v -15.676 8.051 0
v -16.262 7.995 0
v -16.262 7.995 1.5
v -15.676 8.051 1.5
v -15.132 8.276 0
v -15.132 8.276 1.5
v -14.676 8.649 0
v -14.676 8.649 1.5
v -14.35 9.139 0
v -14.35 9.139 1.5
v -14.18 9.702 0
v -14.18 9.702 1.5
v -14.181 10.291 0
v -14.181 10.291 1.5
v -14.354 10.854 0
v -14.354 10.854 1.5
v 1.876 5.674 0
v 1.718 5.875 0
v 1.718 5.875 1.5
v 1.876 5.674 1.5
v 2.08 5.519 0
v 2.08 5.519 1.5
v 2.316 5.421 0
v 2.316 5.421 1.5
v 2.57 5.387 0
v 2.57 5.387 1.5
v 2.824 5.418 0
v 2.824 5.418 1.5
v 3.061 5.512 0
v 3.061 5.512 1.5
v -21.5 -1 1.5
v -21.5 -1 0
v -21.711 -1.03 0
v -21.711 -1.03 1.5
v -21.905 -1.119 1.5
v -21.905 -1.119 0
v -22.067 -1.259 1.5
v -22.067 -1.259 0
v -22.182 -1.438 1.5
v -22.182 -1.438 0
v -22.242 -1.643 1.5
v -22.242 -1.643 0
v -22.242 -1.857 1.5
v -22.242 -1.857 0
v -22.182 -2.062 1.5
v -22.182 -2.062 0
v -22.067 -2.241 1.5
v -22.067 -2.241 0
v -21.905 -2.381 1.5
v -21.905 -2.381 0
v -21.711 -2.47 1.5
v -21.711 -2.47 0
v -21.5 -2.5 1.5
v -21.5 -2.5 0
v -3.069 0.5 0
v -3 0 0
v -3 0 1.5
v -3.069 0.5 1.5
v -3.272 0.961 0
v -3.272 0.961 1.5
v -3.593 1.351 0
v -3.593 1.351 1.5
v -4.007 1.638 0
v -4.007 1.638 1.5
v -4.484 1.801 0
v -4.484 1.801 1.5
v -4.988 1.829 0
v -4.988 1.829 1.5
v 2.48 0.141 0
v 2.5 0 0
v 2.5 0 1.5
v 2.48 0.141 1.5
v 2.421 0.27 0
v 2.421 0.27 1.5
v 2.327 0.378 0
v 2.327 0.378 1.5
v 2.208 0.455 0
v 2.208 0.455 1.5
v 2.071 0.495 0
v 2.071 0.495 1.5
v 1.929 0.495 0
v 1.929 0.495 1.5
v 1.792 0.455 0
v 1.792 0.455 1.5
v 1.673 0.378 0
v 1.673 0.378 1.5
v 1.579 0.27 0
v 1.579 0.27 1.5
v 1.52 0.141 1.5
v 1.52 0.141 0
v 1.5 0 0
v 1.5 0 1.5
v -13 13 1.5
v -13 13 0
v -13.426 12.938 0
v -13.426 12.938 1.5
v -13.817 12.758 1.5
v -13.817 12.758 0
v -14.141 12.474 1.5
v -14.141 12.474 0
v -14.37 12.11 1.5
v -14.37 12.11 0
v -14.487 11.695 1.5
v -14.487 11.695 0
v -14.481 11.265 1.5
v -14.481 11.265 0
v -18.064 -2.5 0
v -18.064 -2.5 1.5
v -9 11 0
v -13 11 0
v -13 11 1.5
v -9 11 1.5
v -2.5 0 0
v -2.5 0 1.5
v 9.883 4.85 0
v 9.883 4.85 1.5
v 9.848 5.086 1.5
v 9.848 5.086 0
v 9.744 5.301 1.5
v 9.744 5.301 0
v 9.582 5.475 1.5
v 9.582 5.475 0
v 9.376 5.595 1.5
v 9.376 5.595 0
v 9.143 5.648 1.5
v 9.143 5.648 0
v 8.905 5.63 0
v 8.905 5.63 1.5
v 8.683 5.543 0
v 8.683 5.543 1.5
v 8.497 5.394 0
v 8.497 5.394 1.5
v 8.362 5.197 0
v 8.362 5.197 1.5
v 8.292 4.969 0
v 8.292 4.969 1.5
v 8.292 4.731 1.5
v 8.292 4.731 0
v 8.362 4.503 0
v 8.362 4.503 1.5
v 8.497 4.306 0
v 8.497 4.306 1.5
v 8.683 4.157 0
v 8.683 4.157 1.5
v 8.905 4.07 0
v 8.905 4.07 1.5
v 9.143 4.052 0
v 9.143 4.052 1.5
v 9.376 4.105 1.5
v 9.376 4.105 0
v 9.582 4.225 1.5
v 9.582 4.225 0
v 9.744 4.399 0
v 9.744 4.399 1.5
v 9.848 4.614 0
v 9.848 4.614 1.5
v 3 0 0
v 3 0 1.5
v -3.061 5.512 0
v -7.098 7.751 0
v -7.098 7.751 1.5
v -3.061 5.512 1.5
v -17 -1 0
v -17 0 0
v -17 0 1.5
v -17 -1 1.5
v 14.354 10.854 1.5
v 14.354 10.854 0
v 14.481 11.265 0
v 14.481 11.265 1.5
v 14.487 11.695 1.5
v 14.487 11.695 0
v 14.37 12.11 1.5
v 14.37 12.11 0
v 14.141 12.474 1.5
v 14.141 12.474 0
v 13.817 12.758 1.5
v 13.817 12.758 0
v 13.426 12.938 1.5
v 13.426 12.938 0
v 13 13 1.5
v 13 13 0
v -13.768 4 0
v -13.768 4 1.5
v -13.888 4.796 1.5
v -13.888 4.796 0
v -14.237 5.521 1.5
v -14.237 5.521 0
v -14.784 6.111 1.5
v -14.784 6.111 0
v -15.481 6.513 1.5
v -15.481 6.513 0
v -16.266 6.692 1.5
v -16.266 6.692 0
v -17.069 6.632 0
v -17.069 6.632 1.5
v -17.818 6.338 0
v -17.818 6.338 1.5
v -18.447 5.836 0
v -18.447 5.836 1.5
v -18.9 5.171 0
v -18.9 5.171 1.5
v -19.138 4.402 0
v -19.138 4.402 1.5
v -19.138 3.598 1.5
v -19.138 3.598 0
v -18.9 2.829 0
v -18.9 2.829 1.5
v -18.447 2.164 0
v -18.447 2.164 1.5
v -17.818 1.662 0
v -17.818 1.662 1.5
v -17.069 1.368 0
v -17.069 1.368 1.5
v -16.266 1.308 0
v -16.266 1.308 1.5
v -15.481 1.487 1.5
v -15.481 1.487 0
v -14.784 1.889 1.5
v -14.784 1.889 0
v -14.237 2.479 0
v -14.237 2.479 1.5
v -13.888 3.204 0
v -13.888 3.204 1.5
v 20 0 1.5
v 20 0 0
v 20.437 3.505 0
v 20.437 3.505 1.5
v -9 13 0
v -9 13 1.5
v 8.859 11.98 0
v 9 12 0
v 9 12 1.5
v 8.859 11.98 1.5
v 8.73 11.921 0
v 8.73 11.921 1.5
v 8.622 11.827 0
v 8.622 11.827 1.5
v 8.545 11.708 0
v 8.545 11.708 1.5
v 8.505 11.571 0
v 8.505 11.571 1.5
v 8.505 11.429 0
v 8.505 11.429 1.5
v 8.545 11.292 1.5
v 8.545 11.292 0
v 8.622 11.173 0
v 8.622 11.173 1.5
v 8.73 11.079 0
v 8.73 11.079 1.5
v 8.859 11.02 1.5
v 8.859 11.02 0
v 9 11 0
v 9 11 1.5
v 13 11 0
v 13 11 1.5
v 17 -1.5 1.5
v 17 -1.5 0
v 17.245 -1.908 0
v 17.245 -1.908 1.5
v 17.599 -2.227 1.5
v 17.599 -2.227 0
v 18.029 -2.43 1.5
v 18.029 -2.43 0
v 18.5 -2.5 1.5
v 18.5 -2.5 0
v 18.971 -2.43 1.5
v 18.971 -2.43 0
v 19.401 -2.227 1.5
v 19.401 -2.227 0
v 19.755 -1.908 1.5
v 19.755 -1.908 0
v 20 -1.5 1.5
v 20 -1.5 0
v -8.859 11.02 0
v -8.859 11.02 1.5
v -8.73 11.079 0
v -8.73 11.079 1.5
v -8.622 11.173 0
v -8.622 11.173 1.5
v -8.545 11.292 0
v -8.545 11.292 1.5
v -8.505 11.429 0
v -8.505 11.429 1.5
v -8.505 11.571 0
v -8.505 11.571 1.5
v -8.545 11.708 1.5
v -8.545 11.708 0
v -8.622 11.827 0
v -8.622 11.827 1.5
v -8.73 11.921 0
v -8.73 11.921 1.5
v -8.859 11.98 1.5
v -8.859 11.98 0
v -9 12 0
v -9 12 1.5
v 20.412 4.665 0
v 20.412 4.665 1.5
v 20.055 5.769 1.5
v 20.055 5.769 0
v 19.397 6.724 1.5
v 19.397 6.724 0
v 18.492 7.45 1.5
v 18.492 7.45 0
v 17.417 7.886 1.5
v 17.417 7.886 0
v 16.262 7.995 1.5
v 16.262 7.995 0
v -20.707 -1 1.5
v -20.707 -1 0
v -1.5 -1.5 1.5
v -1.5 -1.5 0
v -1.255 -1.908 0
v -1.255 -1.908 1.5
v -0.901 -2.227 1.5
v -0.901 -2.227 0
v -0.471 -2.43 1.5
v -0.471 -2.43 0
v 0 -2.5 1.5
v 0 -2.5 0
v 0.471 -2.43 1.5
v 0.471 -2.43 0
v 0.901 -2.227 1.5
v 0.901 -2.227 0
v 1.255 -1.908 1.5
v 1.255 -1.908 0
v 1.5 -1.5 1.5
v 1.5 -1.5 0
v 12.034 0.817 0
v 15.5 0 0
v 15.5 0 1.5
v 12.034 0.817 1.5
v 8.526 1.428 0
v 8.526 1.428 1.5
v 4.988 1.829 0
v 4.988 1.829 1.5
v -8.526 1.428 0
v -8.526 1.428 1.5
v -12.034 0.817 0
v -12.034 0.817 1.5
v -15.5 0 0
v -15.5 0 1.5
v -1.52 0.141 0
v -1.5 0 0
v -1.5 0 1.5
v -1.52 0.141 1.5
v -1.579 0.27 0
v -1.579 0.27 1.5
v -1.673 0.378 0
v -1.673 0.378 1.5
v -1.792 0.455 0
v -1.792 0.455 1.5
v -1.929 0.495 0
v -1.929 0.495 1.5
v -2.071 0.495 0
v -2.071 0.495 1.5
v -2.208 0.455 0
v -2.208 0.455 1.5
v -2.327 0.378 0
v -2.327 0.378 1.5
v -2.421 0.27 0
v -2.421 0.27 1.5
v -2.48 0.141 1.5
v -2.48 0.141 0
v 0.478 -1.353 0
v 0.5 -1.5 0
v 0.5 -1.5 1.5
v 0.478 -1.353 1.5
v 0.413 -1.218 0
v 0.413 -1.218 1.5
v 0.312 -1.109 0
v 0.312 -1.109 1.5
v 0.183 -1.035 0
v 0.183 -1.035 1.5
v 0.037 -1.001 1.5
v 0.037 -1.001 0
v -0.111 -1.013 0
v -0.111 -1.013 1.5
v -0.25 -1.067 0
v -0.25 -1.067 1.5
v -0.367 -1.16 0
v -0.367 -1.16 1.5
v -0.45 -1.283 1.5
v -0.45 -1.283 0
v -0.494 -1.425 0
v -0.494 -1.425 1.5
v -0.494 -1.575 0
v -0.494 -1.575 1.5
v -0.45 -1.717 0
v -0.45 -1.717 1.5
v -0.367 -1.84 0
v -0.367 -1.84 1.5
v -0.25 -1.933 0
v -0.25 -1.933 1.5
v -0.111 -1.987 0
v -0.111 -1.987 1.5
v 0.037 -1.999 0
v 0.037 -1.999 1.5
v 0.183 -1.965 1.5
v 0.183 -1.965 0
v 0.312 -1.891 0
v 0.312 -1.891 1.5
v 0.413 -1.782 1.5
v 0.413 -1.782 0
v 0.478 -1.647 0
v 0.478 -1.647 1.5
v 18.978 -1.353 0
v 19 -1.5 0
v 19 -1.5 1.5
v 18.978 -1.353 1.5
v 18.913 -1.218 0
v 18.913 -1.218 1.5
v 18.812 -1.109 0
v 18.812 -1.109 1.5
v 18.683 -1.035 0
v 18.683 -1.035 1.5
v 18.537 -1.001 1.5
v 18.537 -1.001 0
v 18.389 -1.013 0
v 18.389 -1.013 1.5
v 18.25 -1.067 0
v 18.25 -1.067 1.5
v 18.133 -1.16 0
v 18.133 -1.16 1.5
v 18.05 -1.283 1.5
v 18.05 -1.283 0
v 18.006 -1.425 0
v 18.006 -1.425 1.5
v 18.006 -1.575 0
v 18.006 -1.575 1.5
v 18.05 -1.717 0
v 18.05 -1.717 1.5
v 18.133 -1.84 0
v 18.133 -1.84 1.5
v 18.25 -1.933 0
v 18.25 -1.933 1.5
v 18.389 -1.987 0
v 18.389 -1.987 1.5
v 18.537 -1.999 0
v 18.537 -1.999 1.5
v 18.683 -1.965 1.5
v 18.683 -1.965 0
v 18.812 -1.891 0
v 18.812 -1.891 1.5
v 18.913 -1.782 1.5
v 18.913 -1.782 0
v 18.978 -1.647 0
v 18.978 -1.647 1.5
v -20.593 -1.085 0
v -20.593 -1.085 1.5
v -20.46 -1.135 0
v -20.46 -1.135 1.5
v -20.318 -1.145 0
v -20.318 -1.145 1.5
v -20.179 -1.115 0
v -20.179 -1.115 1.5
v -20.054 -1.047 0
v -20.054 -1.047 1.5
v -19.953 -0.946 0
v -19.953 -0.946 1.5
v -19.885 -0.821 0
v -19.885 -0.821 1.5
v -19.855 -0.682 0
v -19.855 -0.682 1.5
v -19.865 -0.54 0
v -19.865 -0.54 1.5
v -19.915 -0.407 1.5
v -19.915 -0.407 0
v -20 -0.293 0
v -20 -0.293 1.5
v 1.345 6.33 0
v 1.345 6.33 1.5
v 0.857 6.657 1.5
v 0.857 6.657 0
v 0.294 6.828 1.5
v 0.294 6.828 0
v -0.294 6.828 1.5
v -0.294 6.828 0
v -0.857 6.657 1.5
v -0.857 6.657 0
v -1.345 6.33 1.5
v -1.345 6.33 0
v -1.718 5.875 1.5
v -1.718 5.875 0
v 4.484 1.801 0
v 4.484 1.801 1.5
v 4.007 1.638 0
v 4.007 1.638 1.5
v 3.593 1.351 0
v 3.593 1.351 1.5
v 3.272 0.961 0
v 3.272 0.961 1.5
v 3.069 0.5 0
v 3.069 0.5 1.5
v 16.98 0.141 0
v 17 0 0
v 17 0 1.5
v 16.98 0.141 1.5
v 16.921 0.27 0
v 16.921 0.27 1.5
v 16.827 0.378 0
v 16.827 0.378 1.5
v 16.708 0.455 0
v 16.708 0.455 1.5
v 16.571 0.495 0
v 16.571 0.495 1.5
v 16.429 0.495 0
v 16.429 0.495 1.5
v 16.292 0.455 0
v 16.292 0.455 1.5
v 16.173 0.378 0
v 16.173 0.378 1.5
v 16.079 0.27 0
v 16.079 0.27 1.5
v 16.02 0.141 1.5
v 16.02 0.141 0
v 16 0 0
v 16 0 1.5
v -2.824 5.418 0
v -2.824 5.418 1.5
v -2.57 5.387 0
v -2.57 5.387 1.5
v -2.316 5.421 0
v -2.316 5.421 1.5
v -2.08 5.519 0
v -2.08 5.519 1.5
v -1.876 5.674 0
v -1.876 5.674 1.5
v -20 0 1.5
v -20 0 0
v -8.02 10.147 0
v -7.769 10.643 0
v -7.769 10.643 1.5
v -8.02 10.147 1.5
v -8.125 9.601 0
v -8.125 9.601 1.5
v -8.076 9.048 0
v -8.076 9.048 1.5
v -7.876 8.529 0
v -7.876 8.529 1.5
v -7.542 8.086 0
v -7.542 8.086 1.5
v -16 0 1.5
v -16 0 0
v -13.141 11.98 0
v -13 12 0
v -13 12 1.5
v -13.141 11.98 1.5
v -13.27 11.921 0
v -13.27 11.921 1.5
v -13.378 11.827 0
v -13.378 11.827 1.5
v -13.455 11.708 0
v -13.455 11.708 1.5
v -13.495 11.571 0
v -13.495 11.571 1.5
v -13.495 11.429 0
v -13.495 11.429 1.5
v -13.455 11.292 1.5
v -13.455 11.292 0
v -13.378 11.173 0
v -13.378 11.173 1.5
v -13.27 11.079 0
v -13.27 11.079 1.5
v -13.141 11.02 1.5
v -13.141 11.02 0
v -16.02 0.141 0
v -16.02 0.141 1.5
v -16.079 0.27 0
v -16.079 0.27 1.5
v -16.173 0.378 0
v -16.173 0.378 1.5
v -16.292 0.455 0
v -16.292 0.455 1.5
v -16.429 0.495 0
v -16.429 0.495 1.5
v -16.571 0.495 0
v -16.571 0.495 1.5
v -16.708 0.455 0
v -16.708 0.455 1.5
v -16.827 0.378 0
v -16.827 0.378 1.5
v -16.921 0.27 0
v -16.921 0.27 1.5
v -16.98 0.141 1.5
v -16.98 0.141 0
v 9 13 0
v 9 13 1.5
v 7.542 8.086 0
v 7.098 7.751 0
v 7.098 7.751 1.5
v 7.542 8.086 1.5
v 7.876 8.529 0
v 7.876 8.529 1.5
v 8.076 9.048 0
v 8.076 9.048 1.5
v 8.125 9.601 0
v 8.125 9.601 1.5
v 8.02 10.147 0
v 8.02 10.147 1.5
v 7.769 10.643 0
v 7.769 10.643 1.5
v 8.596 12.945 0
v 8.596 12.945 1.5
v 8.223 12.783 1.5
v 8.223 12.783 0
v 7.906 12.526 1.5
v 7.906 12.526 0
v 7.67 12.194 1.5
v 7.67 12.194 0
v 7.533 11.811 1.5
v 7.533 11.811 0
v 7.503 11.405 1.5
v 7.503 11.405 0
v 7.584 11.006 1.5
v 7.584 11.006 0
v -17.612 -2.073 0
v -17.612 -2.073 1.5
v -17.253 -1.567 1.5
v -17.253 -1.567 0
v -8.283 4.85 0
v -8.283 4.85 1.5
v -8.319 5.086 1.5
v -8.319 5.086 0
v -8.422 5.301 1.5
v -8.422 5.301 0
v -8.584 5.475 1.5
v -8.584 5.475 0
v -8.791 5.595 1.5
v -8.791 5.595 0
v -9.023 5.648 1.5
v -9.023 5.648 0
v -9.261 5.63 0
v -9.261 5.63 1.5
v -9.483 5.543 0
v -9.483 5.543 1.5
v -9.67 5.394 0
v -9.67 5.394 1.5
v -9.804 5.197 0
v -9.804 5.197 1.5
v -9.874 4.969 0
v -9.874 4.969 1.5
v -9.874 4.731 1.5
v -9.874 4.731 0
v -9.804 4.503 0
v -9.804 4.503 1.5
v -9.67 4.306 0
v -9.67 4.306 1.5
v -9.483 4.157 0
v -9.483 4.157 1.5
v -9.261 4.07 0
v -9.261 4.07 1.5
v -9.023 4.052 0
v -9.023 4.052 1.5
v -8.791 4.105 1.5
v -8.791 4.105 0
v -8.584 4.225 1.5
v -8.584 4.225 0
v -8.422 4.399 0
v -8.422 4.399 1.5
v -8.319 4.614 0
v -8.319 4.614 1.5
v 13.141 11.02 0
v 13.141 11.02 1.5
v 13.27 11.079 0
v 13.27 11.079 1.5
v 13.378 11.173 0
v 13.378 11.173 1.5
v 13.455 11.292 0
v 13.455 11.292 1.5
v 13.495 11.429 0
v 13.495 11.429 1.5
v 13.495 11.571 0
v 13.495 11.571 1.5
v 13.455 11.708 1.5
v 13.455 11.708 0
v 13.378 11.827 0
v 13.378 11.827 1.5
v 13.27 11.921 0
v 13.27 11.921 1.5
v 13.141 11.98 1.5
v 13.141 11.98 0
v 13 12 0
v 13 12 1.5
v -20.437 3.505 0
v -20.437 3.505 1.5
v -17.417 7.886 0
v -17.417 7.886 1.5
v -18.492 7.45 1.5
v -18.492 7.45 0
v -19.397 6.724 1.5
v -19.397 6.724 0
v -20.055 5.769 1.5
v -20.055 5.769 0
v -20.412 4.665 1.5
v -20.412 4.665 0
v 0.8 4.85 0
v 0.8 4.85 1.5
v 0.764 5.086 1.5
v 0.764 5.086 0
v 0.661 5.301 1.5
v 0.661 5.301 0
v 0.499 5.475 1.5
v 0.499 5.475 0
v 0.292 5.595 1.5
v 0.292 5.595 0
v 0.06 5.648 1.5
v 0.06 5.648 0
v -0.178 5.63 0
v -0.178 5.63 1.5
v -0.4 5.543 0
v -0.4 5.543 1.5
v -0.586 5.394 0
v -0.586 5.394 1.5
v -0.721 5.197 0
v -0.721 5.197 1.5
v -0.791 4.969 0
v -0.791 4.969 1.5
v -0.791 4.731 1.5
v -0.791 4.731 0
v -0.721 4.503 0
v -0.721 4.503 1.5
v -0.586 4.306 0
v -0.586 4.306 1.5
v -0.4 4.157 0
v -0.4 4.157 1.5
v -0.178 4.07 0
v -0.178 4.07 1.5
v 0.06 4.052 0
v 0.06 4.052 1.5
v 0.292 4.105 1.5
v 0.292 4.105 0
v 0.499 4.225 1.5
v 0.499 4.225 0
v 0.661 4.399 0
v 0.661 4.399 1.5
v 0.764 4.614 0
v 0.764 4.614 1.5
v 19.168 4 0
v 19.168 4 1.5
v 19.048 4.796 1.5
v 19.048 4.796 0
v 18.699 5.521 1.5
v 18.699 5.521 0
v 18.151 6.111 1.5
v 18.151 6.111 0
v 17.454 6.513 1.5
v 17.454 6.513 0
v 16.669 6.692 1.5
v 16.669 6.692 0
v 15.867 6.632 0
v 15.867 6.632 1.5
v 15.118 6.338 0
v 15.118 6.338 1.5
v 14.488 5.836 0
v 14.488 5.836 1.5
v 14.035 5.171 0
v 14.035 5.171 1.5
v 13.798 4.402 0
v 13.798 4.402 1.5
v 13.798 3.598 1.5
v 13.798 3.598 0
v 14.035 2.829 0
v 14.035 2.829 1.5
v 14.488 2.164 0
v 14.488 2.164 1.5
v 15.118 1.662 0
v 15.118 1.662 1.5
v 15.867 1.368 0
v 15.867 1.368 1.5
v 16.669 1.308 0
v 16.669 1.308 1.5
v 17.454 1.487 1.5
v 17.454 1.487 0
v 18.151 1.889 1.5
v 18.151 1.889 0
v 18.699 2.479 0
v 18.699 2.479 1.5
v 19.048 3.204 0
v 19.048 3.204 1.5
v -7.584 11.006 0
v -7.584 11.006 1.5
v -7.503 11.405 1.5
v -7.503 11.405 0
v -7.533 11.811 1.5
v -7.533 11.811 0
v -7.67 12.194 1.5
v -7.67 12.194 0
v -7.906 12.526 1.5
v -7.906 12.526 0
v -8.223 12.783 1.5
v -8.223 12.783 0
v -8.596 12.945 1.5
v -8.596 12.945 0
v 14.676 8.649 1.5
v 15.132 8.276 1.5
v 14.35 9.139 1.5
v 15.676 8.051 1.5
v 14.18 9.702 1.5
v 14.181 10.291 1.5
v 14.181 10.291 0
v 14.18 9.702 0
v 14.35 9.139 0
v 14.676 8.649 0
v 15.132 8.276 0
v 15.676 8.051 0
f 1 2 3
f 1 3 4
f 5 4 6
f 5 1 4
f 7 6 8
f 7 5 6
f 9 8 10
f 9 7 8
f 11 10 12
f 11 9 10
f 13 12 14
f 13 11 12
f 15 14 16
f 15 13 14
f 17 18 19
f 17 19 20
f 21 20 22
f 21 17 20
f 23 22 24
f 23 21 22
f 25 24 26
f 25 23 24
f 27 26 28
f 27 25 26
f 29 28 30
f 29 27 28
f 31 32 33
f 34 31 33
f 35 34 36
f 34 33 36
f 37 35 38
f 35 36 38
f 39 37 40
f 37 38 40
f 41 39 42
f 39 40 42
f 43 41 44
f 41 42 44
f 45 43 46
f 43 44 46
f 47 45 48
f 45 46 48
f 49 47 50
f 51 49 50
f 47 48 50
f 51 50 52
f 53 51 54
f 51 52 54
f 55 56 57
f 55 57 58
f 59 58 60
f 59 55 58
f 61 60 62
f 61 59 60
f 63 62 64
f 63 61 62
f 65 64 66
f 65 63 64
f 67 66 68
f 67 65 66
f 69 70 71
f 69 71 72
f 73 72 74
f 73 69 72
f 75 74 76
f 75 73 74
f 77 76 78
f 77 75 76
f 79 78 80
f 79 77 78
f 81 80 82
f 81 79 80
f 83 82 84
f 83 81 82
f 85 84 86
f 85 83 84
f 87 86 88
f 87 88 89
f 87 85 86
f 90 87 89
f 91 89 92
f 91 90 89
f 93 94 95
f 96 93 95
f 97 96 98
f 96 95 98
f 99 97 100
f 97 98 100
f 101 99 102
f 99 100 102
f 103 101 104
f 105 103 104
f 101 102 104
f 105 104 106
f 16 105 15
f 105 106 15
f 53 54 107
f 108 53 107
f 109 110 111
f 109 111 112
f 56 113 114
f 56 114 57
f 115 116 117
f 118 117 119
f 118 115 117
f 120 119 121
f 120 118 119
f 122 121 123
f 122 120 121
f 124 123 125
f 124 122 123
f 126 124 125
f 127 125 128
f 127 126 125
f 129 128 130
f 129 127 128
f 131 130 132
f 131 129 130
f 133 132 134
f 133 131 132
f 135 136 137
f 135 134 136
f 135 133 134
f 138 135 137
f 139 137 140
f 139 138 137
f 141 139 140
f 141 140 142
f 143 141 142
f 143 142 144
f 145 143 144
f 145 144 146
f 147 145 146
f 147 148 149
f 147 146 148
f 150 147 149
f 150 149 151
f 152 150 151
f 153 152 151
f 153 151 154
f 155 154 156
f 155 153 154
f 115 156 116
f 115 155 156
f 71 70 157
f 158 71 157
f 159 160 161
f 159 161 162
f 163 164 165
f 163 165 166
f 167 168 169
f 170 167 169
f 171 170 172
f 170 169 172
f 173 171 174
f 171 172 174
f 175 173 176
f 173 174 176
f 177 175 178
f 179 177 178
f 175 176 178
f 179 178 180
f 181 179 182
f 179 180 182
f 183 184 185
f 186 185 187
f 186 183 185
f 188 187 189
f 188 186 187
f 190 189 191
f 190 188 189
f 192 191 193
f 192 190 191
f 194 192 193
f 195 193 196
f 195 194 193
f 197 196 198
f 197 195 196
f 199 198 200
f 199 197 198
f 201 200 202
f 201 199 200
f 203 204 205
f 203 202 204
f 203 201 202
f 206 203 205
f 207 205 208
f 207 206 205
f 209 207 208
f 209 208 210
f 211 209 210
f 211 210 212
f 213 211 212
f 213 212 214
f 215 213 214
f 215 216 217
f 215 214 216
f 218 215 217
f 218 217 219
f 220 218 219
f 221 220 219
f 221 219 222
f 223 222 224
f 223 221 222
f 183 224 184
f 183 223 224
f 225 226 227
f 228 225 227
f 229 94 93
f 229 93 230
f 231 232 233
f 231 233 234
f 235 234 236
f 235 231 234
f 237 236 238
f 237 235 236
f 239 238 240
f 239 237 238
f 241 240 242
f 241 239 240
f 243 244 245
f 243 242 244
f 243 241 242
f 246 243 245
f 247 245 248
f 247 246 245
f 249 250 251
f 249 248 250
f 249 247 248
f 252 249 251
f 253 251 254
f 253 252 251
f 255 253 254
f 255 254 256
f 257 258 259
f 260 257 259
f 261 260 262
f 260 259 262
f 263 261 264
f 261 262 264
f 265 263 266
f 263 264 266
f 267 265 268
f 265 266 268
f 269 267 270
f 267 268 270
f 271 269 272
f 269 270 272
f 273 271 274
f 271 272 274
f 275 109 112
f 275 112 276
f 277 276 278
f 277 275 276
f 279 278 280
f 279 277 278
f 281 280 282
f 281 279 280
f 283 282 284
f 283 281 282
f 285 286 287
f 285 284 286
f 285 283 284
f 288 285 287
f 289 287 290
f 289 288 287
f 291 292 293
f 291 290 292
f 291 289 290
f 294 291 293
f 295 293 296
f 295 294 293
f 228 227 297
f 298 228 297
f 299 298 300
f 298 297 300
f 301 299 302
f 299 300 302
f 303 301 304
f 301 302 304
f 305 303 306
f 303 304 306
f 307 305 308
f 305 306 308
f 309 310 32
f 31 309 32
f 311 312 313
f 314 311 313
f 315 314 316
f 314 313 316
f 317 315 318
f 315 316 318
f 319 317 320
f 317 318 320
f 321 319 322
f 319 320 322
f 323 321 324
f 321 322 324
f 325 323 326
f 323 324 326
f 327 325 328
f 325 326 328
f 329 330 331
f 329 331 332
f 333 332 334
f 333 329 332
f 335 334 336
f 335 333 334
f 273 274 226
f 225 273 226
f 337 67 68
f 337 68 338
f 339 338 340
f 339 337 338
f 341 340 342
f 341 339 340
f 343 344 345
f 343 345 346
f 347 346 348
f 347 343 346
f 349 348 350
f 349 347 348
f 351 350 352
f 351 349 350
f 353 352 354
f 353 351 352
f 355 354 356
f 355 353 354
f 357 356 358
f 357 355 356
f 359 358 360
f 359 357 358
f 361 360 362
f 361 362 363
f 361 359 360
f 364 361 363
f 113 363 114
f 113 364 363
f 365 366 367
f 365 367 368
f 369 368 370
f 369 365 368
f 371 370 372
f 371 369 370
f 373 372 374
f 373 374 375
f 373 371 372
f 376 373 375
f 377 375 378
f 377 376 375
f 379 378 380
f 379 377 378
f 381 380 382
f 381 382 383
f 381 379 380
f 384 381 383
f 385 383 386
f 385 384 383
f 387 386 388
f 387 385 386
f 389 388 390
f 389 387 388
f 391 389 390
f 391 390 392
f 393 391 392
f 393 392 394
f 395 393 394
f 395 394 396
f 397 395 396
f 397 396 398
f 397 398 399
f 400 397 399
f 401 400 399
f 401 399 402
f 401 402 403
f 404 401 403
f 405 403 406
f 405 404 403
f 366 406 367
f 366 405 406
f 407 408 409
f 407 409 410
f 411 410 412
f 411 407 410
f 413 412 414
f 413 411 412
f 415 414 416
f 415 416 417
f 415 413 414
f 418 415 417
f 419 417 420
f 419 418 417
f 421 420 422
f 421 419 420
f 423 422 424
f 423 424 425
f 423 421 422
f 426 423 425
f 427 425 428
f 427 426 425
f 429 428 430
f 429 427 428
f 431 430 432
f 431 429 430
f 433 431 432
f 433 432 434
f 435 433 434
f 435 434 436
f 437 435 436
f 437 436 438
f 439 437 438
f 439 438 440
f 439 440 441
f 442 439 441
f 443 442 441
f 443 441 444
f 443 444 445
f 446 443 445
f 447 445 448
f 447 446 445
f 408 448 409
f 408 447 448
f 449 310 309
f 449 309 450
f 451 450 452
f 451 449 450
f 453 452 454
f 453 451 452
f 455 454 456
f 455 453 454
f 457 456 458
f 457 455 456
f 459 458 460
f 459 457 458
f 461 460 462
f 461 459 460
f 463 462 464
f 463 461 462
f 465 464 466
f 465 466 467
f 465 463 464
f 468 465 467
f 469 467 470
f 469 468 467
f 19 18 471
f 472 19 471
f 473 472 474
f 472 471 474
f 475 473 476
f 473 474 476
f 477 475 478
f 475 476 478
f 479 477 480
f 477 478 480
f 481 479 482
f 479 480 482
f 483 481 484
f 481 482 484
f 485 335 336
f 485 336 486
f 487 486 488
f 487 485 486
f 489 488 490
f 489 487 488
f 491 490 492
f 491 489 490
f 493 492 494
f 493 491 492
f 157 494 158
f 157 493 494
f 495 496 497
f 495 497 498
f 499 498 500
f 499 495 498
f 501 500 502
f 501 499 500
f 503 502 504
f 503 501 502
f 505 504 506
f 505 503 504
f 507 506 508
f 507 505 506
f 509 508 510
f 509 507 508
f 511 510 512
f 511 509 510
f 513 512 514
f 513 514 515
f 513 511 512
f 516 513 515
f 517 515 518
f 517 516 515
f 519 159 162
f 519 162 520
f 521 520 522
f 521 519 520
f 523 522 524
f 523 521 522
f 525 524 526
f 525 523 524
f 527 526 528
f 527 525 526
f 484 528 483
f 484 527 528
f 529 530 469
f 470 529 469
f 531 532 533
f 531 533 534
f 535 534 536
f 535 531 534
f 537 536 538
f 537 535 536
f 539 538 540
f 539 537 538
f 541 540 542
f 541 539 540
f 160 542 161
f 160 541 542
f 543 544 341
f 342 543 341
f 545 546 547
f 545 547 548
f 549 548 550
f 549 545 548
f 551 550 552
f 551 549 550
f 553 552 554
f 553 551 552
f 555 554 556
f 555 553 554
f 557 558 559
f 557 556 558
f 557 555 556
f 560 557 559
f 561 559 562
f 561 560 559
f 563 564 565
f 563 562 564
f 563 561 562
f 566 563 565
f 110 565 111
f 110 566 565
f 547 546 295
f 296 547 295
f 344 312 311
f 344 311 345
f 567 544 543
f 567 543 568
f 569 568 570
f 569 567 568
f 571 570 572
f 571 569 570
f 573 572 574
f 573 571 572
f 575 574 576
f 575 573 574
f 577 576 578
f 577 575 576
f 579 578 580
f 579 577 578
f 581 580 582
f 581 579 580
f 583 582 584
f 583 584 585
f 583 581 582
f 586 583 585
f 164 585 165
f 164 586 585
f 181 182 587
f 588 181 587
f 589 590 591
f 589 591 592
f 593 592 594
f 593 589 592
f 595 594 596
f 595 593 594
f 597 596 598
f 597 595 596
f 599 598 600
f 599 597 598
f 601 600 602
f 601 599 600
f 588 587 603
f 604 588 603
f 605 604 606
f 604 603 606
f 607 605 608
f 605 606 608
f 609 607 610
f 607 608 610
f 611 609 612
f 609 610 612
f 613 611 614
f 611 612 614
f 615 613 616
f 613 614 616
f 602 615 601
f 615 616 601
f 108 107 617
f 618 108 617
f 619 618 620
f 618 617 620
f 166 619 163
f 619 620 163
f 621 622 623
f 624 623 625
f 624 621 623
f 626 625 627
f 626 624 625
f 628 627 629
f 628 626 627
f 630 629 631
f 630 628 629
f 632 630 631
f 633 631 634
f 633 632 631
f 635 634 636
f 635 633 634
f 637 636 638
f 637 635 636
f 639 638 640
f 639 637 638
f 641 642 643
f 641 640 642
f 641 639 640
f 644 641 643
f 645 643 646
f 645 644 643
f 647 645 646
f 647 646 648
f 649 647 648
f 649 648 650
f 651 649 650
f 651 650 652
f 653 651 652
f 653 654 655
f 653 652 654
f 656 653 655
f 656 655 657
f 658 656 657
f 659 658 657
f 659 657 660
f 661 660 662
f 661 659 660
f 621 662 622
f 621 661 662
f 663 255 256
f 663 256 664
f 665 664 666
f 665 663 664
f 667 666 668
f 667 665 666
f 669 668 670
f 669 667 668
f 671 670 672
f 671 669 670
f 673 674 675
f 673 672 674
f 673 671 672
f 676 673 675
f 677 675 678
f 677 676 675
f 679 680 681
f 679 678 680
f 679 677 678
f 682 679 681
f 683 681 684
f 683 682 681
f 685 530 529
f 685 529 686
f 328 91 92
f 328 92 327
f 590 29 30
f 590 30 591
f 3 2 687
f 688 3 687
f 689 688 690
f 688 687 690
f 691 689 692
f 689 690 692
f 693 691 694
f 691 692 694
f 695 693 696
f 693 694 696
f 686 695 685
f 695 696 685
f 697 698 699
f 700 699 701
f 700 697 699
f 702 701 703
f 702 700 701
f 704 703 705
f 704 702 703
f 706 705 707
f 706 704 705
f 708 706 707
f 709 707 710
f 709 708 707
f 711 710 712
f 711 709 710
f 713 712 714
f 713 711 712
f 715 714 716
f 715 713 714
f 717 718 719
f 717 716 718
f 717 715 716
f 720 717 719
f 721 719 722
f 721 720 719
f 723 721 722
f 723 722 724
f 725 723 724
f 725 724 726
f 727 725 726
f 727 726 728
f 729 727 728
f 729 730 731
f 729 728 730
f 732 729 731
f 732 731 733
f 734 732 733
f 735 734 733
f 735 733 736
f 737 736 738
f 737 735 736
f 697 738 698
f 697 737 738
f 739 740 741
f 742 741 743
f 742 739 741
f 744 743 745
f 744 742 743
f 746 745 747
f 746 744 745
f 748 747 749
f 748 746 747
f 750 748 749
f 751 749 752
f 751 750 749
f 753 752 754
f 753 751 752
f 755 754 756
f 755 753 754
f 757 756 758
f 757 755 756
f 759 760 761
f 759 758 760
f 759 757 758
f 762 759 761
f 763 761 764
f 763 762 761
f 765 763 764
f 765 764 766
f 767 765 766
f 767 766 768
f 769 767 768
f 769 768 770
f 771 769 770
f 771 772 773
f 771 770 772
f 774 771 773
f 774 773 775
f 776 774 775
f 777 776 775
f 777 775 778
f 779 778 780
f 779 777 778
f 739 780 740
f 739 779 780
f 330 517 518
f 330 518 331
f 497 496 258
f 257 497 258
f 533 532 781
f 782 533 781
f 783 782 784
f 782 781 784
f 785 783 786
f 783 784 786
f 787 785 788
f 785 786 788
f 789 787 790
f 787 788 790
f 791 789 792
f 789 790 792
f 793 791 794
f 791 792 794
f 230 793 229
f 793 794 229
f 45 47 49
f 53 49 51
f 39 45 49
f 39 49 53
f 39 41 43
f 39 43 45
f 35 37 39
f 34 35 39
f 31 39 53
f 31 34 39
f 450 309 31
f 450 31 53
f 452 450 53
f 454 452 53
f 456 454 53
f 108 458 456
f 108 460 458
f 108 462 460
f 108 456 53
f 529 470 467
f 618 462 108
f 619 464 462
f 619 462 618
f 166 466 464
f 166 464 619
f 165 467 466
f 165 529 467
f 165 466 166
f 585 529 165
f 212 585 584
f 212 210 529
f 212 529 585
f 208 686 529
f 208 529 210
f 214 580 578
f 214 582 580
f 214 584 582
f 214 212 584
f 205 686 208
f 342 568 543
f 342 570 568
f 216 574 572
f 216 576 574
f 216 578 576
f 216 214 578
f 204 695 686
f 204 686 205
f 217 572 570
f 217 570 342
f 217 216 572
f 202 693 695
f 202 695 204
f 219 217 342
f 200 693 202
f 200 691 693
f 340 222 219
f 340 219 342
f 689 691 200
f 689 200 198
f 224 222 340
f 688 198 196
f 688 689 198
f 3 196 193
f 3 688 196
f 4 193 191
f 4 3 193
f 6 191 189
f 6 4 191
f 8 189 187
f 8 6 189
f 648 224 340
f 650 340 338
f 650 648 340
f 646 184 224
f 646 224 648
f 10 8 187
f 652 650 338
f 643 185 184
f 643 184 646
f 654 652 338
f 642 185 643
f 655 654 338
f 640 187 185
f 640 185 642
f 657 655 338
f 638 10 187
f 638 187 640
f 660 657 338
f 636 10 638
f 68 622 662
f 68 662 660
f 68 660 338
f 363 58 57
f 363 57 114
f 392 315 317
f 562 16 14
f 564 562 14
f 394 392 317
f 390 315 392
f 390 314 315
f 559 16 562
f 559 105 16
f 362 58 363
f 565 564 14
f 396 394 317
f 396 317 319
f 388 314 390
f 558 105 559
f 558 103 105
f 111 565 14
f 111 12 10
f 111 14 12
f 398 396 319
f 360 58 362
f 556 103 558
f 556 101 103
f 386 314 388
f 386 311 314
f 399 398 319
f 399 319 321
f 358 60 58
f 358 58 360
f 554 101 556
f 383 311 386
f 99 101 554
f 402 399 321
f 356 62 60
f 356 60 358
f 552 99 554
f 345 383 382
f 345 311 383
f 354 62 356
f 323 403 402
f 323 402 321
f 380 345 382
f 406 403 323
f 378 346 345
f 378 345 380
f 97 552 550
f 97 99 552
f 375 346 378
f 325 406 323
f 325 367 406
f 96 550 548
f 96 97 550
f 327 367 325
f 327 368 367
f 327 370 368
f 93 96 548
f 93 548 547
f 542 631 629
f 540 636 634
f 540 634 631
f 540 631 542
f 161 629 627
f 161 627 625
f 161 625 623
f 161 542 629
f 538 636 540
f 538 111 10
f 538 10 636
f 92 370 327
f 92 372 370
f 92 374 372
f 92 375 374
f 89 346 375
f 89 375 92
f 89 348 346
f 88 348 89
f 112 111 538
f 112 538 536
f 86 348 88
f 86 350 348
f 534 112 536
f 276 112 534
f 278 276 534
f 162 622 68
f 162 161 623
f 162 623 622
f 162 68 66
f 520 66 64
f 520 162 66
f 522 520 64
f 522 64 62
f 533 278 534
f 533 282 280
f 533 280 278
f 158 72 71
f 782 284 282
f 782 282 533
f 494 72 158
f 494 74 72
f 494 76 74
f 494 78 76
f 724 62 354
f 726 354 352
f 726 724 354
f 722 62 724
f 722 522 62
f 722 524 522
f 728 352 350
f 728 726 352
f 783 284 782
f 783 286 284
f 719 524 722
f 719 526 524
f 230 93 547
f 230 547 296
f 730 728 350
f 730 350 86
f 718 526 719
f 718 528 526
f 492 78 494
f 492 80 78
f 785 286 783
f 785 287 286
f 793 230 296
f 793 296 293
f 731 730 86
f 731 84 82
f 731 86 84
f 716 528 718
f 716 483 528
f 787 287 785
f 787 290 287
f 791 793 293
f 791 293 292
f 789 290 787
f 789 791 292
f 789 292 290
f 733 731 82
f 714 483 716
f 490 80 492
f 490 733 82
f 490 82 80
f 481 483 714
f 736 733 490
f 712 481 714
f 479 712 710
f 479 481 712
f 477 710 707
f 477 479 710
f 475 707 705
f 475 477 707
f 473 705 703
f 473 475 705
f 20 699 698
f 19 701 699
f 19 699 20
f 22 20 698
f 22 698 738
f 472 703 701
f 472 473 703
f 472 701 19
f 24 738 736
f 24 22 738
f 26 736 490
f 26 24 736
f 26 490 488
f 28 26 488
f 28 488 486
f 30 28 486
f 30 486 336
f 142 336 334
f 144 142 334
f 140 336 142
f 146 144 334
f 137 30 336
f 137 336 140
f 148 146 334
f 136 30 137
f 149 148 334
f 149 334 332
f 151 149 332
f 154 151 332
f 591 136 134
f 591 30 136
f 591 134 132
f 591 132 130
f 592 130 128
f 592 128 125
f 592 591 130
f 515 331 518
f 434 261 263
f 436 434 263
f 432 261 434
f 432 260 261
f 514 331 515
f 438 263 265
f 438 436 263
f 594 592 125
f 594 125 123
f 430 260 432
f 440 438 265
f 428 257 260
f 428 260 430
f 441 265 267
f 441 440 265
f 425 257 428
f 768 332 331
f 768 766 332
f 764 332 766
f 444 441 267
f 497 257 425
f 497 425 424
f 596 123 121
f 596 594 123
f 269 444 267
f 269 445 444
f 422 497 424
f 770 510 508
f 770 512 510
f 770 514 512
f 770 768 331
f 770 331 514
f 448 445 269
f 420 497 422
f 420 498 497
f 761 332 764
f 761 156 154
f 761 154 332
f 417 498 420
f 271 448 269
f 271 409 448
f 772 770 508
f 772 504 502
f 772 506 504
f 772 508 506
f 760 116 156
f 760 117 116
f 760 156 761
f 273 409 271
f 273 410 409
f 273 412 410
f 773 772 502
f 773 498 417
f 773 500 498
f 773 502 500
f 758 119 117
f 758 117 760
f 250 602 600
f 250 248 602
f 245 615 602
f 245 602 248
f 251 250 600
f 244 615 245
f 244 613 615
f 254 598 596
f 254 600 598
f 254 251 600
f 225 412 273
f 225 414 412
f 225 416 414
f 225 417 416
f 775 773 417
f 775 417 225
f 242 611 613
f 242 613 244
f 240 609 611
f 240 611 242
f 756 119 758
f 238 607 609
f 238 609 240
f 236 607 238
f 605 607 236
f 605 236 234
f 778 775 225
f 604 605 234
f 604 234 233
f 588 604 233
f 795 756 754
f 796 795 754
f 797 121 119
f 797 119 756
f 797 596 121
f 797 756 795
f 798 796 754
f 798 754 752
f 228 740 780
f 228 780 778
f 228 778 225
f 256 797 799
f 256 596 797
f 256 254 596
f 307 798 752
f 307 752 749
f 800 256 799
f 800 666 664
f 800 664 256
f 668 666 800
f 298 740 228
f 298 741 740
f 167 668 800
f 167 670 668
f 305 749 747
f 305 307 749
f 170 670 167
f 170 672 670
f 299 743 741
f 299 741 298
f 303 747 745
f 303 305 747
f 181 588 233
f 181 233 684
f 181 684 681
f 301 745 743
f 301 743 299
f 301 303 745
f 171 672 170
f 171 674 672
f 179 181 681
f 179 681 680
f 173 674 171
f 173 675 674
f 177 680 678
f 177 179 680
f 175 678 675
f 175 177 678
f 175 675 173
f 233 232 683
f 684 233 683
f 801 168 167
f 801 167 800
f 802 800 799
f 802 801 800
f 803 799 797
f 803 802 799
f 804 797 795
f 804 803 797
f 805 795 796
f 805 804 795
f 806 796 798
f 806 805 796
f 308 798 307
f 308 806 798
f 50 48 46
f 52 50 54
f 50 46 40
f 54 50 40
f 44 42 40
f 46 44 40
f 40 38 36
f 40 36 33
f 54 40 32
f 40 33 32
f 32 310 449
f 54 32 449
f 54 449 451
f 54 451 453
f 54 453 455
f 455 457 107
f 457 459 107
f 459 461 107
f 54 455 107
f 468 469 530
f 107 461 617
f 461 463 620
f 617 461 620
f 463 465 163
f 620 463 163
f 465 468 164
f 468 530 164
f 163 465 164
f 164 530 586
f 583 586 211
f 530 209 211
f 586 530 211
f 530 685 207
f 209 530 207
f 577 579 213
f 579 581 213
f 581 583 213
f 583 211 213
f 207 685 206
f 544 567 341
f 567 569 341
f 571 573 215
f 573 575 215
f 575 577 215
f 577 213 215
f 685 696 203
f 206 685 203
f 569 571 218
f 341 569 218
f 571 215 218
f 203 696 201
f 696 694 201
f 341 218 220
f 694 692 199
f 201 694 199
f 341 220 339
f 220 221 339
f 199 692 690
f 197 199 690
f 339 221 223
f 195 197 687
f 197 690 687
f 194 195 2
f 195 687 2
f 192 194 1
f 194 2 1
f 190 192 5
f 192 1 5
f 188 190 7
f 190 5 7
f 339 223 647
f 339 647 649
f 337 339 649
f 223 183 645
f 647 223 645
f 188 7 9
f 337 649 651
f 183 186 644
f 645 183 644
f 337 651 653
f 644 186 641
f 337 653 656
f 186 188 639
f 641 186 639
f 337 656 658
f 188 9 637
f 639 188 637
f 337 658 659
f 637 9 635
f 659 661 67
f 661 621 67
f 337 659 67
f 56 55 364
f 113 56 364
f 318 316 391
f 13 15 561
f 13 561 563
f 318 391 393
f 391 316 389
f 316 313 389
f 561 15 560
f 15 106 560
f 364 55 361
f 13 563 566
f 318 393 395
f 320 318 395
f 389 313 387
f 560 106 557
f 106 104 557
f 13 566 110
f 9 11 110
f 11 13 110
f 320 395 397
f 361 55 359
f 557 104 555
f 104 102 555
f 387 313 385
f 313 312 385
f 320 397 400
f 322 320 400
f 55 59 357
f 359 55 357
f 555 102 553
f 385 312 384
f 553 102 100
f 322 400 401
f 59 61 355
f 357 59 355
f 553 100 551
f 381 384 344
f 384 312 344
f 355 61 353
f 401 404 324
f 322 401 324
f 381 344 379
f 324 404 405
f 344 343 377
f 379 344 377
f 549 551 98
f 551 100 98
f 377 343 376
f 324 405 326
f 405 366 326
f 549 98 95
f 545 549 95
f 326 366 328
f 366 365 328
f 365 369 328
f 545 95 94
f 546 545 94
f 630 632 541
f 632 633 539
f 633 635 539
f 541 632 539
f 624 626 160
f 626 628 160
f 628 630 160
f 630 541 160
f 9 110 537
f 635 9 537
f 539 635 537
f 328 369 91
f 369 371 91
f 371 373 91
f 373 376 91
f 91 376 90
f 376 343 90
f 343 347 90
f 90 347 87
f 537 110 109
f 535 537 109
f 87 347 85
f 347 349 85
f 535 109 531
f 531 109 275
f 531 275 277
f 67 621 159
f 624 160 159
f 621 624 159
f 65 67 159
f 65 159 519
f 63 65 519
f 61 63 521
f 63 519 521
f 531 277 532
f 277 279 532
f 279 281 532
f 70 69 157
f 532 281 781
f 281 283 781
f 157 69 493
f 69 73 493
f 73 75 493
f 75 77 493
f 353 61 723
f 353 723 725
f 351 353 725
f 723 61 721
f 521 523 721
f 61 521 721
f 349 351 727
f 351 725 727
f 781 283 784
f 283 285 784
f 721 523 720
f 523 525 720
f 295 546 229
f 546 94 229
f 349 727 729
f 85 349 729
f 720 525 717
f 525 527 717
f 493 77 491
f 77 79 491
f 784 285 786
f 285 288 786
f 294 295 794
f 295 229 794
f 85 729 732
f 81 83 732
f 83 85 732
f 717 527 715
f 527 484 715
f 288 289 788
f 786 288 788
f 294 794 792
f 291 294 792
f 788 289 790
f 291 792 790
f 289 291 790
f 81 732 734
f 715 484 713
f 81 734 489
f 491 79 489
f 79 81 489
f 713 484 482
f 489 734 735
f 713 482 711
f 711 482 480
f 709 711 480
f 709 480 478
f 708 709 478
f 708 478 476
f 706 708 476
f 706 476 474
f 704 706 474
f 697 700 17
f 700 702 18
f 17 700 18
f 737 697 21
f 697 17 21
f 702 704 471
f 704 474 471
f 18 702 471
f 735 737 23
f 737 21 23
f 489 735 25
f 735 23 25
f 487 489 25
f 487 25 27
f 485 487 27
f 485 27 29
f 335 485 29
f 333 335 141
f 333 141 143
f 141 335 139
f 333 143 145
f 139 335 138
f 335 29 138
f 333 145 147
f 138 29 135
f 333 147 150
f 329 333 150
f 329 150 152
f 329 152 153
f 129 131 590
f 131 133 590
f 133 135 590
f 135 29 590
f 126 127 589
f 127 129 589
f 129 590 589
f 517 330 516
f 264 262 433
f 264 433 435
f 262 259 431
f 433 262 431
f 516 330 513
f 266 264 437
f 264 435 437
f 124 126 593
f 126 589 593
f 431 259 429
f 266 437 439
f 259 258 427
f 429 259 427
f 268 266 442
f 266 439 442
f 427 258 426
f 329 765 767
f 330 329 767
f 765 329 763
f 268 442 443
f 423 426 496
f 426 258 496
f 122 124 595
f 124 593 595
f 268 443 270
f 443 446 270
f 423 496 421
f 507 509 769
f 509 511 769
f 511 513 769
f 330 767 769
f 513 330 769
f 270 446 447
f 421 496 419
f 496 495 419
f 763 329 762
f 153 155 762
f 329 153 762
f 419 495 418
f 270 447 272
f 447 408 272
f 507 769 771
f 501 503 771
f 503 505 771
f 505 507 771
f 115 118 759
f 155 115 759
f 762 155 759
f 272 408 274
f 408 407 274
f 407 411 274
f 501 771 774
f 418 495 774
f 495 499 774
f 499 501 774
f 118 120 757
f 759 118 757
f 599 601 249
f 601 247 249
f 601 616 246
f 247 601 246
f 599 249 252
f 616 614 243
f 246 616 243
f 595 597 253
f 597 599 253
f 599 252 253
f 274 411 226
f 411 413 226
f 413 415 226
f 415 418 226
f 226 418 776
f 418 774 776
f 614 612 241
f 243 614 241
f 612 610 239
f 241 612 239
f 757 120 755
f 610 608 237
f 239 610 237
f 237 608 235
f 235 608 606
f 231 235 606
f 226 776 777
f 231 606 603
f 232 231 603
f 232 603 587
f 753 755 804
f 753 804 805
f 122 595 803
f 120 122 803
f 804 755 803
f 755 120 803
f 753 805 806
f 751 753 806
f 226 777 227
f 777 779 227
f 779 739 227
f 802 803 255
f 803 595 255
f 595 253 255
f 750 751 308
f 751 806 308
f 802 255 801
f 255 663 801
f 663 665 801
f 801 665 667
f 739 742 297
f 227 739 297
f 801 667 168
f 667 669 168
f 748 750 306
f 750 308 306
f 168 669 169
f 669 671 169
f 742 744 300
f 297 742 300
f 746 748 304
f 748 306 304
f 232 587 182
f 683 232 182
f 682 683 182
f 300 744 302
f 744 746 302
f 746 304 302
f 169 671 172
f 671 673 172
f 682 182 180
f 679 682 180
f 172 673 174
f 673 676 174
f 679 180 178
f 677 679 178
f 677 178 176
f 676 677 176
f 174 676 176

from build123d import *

# Parameters (mm, degrees)
SKETCH007_R          = 0.5
PAD001_DEPTH         = 1.5
POCKET_DEPTH         = 1.501
POCKET_DEPTH_BACK    = 0.001
SKETCH_R             = 0.8
SKETCH_R_2           = 2.7
POCKET001_DEPTH      = 1.501
POCKET001_DEPTH_BACK = 0.001


with BuildPart() as part:
    # Sketch007 → Pad001 (new body)
    with BuildSketch(Plane.XY):
        with BuildLine():
            Line((-20, 0), (-20, -0.292893))
            ThreePointArc((-20.707107, -1), (-20, -1), (-20, -0.292893))
            Line((-20.707107, -1), (-21.5, -1))
            ThreePointArc((-21.5, -1), (-22.25, -1.75), (-21.5, -2.5))
            Line((-21.5, -2.5), (-18.063508, -2.5))
            ThreePointArc((-18.063508, -2.5), (-17.420322, -1.829006), (-17, -1))
            Line((-17, 0), (-17, -1))
            ThreePointArc((-16, 0), (-16.5, 0.5), (-17, 0))
            Line((-16, 0), (-15.5, 0))
            ThreePointArc((-4.98789, 1.828965), (-10.284682, 1.148622), (-15.5, 0))
            ThreePointArc((-3, 0), (-3.592665, 1.350631), (-4.98789, 1.828965))
            Line((-2.5, 0), (-3, 0))
            ThreePointArc((-1.5, 0), (-2, 0.5), (-2.5, 0))
            Line((-1.5, -1.5), (-1.5, 0))
            ThreePointArc((-1.5, -1.5), (0, -2.5), (1.5, -1.5))
            Line((1.5, 0), (1.5, -1.5))
            ThreePointArc((2.5, 0), (2, 0.5), (1.5, 0))
            Line((2.5, 0), (3, 0))
            ThreePointArc((4.98789, 1.828965), (3.592665, 1.350631), (3, 0))
            ThreePointArc((15.5, 0), (10.284682, 1.148622), (4.98789, 1.828965))
            Line((16, 0), (15.5, 0))
            ThreePointArc((17, 0), (16.5, 0.5), (16, 0))
            Line((17, 0), (17, -1.5))
            ThreePointArc((17, -1.5), (18.5, -2.5), (20, -1.5))
            Line((20, -1.5), (20, 0))
            Line((20, 0), (20.436997, 3.505138))
            ThreePointArc((20.436997, 3.505138), (19.396762, 6.724105), (16.261564, 7.994684))
            ThreePointArc((14.353635, 10.853725), (14.494893, 8.88186), (16.261564, 7.994684))
            ThreePointArc((14.353635, 10.853725), (14.268742, 12.300184), (13, 13))
            Line((13, 13), (9, 13))
            ThreePointArc((9, 13), (7.6704, 12.194379), (7.769004, 10.642884))
            ThreePointArc((7.097708, 7.751052), (8.075873, 9.047817), (7.769004, 10.642884))
            Line((3.061388, 5.512462), (7.097708, 7.751052))
            ThreePointArc((1.717585, 5.874647), (2.316142, 5.421425), (3.061388, 5.512462))
            ThreePointArc((1.717585, 5.874647), (0, 6.85), (-1.717585, 5.874647))
            ThreePointArc((-3.061388, 5.512462), (-2.316142, 5.421425), (-1.717585, 5.874647))
            Line((-7.097708, 7.751052), (-3.061388, 5.512462))
            ThreePointArc((-7.769004, 10.642884), (-8.075873, 9.047817), (-7.097708, 7.751052))
            ThreePointArc((-7.769004, 10.642884), (-7.6704, 12.19438), (-9, 13))
            Line((-13, 13), (-9, 13))
            ThreePointArc((-13, 13), (-14.268742, 12.300184), (-14.353635, 10.853725))
            ThreePointArc((-16.261564, 7.994684), (-14.494893, 8.88186), (-14.353635, 10.853725))
            ThreePointArc((-16.261564, 7.994684), (-19.396762, 6.724105), (-20.436997, 3.505138))
            Line((-20, 0), (-20.436997, 3.505138))
        make_face()
        with Locations((18.5, -1.5)):
            Circle(SKETCH007_R, mode=Mode.SUBTRACT)
        with Locations((0, -1.5)):
            Circle(SKETCH007_R, mode=Mode.SUBTRACT)
    extrude(amount=PAD001_DEPTH)

    # Sketch006 → Pocket (cut, two sides)
    with BuildSketch(Plane.XY) as pocket_sk:
        with BuildLine():
            ThreePointArc((-13, 12), (-13.5, 11.5), (-13, 11))
            Line((-13, 11), (-9, 11))
            ThreePointArc((-9, 11), (-8.5, 11.5), (-9, 12))
            Line((-13, 12), (-9, 12))
        make_face()
        with BuildLine():
            ThreePointArc((9, 12), (8.5, 11.5), (9, 11))
            Line((9, 11), (13, 11))
            ThreePointArc((13, 11), (13.5, 11.5), (13, 12))
            Line((9, 12), (13, 12))
        make_face()
    extrude(amount=POCKET_DEPTH, mode=Mode.SUBTRACT)
    extrude(pocket_sk.sketch, amount=-POCKET_DEPTH_BACK, mode=Mode.SUBTRACT)

    # Sketch → Pocket001 (cut, two sides)
    with BuildSketch(Plane.XY) as pocket001_sk:
        with Locations((-9.083242, 4.85)):
            Circle(SKETCH_R)
        with Locations((9.083242, 4.85)):
            Circle(SKETCH_R)
        with Locations((0, 4.85)):
            Circle(SKETCH_R)
        with Locations((-16.467726, 4)):
            Circle(SKETCH_R_2)
        with Locations((16.467726, 4)):
            Circle(SKETCH_R_2)
    extrude(amount=POCKET001_DEPTH, mode=Mode.SUBTRACT)
    extrude(pocket001_sk.sketch, amount=-POCKET001_DEPTH_BACK, mode=Mode.SUBTRACT)


solid = part.part
